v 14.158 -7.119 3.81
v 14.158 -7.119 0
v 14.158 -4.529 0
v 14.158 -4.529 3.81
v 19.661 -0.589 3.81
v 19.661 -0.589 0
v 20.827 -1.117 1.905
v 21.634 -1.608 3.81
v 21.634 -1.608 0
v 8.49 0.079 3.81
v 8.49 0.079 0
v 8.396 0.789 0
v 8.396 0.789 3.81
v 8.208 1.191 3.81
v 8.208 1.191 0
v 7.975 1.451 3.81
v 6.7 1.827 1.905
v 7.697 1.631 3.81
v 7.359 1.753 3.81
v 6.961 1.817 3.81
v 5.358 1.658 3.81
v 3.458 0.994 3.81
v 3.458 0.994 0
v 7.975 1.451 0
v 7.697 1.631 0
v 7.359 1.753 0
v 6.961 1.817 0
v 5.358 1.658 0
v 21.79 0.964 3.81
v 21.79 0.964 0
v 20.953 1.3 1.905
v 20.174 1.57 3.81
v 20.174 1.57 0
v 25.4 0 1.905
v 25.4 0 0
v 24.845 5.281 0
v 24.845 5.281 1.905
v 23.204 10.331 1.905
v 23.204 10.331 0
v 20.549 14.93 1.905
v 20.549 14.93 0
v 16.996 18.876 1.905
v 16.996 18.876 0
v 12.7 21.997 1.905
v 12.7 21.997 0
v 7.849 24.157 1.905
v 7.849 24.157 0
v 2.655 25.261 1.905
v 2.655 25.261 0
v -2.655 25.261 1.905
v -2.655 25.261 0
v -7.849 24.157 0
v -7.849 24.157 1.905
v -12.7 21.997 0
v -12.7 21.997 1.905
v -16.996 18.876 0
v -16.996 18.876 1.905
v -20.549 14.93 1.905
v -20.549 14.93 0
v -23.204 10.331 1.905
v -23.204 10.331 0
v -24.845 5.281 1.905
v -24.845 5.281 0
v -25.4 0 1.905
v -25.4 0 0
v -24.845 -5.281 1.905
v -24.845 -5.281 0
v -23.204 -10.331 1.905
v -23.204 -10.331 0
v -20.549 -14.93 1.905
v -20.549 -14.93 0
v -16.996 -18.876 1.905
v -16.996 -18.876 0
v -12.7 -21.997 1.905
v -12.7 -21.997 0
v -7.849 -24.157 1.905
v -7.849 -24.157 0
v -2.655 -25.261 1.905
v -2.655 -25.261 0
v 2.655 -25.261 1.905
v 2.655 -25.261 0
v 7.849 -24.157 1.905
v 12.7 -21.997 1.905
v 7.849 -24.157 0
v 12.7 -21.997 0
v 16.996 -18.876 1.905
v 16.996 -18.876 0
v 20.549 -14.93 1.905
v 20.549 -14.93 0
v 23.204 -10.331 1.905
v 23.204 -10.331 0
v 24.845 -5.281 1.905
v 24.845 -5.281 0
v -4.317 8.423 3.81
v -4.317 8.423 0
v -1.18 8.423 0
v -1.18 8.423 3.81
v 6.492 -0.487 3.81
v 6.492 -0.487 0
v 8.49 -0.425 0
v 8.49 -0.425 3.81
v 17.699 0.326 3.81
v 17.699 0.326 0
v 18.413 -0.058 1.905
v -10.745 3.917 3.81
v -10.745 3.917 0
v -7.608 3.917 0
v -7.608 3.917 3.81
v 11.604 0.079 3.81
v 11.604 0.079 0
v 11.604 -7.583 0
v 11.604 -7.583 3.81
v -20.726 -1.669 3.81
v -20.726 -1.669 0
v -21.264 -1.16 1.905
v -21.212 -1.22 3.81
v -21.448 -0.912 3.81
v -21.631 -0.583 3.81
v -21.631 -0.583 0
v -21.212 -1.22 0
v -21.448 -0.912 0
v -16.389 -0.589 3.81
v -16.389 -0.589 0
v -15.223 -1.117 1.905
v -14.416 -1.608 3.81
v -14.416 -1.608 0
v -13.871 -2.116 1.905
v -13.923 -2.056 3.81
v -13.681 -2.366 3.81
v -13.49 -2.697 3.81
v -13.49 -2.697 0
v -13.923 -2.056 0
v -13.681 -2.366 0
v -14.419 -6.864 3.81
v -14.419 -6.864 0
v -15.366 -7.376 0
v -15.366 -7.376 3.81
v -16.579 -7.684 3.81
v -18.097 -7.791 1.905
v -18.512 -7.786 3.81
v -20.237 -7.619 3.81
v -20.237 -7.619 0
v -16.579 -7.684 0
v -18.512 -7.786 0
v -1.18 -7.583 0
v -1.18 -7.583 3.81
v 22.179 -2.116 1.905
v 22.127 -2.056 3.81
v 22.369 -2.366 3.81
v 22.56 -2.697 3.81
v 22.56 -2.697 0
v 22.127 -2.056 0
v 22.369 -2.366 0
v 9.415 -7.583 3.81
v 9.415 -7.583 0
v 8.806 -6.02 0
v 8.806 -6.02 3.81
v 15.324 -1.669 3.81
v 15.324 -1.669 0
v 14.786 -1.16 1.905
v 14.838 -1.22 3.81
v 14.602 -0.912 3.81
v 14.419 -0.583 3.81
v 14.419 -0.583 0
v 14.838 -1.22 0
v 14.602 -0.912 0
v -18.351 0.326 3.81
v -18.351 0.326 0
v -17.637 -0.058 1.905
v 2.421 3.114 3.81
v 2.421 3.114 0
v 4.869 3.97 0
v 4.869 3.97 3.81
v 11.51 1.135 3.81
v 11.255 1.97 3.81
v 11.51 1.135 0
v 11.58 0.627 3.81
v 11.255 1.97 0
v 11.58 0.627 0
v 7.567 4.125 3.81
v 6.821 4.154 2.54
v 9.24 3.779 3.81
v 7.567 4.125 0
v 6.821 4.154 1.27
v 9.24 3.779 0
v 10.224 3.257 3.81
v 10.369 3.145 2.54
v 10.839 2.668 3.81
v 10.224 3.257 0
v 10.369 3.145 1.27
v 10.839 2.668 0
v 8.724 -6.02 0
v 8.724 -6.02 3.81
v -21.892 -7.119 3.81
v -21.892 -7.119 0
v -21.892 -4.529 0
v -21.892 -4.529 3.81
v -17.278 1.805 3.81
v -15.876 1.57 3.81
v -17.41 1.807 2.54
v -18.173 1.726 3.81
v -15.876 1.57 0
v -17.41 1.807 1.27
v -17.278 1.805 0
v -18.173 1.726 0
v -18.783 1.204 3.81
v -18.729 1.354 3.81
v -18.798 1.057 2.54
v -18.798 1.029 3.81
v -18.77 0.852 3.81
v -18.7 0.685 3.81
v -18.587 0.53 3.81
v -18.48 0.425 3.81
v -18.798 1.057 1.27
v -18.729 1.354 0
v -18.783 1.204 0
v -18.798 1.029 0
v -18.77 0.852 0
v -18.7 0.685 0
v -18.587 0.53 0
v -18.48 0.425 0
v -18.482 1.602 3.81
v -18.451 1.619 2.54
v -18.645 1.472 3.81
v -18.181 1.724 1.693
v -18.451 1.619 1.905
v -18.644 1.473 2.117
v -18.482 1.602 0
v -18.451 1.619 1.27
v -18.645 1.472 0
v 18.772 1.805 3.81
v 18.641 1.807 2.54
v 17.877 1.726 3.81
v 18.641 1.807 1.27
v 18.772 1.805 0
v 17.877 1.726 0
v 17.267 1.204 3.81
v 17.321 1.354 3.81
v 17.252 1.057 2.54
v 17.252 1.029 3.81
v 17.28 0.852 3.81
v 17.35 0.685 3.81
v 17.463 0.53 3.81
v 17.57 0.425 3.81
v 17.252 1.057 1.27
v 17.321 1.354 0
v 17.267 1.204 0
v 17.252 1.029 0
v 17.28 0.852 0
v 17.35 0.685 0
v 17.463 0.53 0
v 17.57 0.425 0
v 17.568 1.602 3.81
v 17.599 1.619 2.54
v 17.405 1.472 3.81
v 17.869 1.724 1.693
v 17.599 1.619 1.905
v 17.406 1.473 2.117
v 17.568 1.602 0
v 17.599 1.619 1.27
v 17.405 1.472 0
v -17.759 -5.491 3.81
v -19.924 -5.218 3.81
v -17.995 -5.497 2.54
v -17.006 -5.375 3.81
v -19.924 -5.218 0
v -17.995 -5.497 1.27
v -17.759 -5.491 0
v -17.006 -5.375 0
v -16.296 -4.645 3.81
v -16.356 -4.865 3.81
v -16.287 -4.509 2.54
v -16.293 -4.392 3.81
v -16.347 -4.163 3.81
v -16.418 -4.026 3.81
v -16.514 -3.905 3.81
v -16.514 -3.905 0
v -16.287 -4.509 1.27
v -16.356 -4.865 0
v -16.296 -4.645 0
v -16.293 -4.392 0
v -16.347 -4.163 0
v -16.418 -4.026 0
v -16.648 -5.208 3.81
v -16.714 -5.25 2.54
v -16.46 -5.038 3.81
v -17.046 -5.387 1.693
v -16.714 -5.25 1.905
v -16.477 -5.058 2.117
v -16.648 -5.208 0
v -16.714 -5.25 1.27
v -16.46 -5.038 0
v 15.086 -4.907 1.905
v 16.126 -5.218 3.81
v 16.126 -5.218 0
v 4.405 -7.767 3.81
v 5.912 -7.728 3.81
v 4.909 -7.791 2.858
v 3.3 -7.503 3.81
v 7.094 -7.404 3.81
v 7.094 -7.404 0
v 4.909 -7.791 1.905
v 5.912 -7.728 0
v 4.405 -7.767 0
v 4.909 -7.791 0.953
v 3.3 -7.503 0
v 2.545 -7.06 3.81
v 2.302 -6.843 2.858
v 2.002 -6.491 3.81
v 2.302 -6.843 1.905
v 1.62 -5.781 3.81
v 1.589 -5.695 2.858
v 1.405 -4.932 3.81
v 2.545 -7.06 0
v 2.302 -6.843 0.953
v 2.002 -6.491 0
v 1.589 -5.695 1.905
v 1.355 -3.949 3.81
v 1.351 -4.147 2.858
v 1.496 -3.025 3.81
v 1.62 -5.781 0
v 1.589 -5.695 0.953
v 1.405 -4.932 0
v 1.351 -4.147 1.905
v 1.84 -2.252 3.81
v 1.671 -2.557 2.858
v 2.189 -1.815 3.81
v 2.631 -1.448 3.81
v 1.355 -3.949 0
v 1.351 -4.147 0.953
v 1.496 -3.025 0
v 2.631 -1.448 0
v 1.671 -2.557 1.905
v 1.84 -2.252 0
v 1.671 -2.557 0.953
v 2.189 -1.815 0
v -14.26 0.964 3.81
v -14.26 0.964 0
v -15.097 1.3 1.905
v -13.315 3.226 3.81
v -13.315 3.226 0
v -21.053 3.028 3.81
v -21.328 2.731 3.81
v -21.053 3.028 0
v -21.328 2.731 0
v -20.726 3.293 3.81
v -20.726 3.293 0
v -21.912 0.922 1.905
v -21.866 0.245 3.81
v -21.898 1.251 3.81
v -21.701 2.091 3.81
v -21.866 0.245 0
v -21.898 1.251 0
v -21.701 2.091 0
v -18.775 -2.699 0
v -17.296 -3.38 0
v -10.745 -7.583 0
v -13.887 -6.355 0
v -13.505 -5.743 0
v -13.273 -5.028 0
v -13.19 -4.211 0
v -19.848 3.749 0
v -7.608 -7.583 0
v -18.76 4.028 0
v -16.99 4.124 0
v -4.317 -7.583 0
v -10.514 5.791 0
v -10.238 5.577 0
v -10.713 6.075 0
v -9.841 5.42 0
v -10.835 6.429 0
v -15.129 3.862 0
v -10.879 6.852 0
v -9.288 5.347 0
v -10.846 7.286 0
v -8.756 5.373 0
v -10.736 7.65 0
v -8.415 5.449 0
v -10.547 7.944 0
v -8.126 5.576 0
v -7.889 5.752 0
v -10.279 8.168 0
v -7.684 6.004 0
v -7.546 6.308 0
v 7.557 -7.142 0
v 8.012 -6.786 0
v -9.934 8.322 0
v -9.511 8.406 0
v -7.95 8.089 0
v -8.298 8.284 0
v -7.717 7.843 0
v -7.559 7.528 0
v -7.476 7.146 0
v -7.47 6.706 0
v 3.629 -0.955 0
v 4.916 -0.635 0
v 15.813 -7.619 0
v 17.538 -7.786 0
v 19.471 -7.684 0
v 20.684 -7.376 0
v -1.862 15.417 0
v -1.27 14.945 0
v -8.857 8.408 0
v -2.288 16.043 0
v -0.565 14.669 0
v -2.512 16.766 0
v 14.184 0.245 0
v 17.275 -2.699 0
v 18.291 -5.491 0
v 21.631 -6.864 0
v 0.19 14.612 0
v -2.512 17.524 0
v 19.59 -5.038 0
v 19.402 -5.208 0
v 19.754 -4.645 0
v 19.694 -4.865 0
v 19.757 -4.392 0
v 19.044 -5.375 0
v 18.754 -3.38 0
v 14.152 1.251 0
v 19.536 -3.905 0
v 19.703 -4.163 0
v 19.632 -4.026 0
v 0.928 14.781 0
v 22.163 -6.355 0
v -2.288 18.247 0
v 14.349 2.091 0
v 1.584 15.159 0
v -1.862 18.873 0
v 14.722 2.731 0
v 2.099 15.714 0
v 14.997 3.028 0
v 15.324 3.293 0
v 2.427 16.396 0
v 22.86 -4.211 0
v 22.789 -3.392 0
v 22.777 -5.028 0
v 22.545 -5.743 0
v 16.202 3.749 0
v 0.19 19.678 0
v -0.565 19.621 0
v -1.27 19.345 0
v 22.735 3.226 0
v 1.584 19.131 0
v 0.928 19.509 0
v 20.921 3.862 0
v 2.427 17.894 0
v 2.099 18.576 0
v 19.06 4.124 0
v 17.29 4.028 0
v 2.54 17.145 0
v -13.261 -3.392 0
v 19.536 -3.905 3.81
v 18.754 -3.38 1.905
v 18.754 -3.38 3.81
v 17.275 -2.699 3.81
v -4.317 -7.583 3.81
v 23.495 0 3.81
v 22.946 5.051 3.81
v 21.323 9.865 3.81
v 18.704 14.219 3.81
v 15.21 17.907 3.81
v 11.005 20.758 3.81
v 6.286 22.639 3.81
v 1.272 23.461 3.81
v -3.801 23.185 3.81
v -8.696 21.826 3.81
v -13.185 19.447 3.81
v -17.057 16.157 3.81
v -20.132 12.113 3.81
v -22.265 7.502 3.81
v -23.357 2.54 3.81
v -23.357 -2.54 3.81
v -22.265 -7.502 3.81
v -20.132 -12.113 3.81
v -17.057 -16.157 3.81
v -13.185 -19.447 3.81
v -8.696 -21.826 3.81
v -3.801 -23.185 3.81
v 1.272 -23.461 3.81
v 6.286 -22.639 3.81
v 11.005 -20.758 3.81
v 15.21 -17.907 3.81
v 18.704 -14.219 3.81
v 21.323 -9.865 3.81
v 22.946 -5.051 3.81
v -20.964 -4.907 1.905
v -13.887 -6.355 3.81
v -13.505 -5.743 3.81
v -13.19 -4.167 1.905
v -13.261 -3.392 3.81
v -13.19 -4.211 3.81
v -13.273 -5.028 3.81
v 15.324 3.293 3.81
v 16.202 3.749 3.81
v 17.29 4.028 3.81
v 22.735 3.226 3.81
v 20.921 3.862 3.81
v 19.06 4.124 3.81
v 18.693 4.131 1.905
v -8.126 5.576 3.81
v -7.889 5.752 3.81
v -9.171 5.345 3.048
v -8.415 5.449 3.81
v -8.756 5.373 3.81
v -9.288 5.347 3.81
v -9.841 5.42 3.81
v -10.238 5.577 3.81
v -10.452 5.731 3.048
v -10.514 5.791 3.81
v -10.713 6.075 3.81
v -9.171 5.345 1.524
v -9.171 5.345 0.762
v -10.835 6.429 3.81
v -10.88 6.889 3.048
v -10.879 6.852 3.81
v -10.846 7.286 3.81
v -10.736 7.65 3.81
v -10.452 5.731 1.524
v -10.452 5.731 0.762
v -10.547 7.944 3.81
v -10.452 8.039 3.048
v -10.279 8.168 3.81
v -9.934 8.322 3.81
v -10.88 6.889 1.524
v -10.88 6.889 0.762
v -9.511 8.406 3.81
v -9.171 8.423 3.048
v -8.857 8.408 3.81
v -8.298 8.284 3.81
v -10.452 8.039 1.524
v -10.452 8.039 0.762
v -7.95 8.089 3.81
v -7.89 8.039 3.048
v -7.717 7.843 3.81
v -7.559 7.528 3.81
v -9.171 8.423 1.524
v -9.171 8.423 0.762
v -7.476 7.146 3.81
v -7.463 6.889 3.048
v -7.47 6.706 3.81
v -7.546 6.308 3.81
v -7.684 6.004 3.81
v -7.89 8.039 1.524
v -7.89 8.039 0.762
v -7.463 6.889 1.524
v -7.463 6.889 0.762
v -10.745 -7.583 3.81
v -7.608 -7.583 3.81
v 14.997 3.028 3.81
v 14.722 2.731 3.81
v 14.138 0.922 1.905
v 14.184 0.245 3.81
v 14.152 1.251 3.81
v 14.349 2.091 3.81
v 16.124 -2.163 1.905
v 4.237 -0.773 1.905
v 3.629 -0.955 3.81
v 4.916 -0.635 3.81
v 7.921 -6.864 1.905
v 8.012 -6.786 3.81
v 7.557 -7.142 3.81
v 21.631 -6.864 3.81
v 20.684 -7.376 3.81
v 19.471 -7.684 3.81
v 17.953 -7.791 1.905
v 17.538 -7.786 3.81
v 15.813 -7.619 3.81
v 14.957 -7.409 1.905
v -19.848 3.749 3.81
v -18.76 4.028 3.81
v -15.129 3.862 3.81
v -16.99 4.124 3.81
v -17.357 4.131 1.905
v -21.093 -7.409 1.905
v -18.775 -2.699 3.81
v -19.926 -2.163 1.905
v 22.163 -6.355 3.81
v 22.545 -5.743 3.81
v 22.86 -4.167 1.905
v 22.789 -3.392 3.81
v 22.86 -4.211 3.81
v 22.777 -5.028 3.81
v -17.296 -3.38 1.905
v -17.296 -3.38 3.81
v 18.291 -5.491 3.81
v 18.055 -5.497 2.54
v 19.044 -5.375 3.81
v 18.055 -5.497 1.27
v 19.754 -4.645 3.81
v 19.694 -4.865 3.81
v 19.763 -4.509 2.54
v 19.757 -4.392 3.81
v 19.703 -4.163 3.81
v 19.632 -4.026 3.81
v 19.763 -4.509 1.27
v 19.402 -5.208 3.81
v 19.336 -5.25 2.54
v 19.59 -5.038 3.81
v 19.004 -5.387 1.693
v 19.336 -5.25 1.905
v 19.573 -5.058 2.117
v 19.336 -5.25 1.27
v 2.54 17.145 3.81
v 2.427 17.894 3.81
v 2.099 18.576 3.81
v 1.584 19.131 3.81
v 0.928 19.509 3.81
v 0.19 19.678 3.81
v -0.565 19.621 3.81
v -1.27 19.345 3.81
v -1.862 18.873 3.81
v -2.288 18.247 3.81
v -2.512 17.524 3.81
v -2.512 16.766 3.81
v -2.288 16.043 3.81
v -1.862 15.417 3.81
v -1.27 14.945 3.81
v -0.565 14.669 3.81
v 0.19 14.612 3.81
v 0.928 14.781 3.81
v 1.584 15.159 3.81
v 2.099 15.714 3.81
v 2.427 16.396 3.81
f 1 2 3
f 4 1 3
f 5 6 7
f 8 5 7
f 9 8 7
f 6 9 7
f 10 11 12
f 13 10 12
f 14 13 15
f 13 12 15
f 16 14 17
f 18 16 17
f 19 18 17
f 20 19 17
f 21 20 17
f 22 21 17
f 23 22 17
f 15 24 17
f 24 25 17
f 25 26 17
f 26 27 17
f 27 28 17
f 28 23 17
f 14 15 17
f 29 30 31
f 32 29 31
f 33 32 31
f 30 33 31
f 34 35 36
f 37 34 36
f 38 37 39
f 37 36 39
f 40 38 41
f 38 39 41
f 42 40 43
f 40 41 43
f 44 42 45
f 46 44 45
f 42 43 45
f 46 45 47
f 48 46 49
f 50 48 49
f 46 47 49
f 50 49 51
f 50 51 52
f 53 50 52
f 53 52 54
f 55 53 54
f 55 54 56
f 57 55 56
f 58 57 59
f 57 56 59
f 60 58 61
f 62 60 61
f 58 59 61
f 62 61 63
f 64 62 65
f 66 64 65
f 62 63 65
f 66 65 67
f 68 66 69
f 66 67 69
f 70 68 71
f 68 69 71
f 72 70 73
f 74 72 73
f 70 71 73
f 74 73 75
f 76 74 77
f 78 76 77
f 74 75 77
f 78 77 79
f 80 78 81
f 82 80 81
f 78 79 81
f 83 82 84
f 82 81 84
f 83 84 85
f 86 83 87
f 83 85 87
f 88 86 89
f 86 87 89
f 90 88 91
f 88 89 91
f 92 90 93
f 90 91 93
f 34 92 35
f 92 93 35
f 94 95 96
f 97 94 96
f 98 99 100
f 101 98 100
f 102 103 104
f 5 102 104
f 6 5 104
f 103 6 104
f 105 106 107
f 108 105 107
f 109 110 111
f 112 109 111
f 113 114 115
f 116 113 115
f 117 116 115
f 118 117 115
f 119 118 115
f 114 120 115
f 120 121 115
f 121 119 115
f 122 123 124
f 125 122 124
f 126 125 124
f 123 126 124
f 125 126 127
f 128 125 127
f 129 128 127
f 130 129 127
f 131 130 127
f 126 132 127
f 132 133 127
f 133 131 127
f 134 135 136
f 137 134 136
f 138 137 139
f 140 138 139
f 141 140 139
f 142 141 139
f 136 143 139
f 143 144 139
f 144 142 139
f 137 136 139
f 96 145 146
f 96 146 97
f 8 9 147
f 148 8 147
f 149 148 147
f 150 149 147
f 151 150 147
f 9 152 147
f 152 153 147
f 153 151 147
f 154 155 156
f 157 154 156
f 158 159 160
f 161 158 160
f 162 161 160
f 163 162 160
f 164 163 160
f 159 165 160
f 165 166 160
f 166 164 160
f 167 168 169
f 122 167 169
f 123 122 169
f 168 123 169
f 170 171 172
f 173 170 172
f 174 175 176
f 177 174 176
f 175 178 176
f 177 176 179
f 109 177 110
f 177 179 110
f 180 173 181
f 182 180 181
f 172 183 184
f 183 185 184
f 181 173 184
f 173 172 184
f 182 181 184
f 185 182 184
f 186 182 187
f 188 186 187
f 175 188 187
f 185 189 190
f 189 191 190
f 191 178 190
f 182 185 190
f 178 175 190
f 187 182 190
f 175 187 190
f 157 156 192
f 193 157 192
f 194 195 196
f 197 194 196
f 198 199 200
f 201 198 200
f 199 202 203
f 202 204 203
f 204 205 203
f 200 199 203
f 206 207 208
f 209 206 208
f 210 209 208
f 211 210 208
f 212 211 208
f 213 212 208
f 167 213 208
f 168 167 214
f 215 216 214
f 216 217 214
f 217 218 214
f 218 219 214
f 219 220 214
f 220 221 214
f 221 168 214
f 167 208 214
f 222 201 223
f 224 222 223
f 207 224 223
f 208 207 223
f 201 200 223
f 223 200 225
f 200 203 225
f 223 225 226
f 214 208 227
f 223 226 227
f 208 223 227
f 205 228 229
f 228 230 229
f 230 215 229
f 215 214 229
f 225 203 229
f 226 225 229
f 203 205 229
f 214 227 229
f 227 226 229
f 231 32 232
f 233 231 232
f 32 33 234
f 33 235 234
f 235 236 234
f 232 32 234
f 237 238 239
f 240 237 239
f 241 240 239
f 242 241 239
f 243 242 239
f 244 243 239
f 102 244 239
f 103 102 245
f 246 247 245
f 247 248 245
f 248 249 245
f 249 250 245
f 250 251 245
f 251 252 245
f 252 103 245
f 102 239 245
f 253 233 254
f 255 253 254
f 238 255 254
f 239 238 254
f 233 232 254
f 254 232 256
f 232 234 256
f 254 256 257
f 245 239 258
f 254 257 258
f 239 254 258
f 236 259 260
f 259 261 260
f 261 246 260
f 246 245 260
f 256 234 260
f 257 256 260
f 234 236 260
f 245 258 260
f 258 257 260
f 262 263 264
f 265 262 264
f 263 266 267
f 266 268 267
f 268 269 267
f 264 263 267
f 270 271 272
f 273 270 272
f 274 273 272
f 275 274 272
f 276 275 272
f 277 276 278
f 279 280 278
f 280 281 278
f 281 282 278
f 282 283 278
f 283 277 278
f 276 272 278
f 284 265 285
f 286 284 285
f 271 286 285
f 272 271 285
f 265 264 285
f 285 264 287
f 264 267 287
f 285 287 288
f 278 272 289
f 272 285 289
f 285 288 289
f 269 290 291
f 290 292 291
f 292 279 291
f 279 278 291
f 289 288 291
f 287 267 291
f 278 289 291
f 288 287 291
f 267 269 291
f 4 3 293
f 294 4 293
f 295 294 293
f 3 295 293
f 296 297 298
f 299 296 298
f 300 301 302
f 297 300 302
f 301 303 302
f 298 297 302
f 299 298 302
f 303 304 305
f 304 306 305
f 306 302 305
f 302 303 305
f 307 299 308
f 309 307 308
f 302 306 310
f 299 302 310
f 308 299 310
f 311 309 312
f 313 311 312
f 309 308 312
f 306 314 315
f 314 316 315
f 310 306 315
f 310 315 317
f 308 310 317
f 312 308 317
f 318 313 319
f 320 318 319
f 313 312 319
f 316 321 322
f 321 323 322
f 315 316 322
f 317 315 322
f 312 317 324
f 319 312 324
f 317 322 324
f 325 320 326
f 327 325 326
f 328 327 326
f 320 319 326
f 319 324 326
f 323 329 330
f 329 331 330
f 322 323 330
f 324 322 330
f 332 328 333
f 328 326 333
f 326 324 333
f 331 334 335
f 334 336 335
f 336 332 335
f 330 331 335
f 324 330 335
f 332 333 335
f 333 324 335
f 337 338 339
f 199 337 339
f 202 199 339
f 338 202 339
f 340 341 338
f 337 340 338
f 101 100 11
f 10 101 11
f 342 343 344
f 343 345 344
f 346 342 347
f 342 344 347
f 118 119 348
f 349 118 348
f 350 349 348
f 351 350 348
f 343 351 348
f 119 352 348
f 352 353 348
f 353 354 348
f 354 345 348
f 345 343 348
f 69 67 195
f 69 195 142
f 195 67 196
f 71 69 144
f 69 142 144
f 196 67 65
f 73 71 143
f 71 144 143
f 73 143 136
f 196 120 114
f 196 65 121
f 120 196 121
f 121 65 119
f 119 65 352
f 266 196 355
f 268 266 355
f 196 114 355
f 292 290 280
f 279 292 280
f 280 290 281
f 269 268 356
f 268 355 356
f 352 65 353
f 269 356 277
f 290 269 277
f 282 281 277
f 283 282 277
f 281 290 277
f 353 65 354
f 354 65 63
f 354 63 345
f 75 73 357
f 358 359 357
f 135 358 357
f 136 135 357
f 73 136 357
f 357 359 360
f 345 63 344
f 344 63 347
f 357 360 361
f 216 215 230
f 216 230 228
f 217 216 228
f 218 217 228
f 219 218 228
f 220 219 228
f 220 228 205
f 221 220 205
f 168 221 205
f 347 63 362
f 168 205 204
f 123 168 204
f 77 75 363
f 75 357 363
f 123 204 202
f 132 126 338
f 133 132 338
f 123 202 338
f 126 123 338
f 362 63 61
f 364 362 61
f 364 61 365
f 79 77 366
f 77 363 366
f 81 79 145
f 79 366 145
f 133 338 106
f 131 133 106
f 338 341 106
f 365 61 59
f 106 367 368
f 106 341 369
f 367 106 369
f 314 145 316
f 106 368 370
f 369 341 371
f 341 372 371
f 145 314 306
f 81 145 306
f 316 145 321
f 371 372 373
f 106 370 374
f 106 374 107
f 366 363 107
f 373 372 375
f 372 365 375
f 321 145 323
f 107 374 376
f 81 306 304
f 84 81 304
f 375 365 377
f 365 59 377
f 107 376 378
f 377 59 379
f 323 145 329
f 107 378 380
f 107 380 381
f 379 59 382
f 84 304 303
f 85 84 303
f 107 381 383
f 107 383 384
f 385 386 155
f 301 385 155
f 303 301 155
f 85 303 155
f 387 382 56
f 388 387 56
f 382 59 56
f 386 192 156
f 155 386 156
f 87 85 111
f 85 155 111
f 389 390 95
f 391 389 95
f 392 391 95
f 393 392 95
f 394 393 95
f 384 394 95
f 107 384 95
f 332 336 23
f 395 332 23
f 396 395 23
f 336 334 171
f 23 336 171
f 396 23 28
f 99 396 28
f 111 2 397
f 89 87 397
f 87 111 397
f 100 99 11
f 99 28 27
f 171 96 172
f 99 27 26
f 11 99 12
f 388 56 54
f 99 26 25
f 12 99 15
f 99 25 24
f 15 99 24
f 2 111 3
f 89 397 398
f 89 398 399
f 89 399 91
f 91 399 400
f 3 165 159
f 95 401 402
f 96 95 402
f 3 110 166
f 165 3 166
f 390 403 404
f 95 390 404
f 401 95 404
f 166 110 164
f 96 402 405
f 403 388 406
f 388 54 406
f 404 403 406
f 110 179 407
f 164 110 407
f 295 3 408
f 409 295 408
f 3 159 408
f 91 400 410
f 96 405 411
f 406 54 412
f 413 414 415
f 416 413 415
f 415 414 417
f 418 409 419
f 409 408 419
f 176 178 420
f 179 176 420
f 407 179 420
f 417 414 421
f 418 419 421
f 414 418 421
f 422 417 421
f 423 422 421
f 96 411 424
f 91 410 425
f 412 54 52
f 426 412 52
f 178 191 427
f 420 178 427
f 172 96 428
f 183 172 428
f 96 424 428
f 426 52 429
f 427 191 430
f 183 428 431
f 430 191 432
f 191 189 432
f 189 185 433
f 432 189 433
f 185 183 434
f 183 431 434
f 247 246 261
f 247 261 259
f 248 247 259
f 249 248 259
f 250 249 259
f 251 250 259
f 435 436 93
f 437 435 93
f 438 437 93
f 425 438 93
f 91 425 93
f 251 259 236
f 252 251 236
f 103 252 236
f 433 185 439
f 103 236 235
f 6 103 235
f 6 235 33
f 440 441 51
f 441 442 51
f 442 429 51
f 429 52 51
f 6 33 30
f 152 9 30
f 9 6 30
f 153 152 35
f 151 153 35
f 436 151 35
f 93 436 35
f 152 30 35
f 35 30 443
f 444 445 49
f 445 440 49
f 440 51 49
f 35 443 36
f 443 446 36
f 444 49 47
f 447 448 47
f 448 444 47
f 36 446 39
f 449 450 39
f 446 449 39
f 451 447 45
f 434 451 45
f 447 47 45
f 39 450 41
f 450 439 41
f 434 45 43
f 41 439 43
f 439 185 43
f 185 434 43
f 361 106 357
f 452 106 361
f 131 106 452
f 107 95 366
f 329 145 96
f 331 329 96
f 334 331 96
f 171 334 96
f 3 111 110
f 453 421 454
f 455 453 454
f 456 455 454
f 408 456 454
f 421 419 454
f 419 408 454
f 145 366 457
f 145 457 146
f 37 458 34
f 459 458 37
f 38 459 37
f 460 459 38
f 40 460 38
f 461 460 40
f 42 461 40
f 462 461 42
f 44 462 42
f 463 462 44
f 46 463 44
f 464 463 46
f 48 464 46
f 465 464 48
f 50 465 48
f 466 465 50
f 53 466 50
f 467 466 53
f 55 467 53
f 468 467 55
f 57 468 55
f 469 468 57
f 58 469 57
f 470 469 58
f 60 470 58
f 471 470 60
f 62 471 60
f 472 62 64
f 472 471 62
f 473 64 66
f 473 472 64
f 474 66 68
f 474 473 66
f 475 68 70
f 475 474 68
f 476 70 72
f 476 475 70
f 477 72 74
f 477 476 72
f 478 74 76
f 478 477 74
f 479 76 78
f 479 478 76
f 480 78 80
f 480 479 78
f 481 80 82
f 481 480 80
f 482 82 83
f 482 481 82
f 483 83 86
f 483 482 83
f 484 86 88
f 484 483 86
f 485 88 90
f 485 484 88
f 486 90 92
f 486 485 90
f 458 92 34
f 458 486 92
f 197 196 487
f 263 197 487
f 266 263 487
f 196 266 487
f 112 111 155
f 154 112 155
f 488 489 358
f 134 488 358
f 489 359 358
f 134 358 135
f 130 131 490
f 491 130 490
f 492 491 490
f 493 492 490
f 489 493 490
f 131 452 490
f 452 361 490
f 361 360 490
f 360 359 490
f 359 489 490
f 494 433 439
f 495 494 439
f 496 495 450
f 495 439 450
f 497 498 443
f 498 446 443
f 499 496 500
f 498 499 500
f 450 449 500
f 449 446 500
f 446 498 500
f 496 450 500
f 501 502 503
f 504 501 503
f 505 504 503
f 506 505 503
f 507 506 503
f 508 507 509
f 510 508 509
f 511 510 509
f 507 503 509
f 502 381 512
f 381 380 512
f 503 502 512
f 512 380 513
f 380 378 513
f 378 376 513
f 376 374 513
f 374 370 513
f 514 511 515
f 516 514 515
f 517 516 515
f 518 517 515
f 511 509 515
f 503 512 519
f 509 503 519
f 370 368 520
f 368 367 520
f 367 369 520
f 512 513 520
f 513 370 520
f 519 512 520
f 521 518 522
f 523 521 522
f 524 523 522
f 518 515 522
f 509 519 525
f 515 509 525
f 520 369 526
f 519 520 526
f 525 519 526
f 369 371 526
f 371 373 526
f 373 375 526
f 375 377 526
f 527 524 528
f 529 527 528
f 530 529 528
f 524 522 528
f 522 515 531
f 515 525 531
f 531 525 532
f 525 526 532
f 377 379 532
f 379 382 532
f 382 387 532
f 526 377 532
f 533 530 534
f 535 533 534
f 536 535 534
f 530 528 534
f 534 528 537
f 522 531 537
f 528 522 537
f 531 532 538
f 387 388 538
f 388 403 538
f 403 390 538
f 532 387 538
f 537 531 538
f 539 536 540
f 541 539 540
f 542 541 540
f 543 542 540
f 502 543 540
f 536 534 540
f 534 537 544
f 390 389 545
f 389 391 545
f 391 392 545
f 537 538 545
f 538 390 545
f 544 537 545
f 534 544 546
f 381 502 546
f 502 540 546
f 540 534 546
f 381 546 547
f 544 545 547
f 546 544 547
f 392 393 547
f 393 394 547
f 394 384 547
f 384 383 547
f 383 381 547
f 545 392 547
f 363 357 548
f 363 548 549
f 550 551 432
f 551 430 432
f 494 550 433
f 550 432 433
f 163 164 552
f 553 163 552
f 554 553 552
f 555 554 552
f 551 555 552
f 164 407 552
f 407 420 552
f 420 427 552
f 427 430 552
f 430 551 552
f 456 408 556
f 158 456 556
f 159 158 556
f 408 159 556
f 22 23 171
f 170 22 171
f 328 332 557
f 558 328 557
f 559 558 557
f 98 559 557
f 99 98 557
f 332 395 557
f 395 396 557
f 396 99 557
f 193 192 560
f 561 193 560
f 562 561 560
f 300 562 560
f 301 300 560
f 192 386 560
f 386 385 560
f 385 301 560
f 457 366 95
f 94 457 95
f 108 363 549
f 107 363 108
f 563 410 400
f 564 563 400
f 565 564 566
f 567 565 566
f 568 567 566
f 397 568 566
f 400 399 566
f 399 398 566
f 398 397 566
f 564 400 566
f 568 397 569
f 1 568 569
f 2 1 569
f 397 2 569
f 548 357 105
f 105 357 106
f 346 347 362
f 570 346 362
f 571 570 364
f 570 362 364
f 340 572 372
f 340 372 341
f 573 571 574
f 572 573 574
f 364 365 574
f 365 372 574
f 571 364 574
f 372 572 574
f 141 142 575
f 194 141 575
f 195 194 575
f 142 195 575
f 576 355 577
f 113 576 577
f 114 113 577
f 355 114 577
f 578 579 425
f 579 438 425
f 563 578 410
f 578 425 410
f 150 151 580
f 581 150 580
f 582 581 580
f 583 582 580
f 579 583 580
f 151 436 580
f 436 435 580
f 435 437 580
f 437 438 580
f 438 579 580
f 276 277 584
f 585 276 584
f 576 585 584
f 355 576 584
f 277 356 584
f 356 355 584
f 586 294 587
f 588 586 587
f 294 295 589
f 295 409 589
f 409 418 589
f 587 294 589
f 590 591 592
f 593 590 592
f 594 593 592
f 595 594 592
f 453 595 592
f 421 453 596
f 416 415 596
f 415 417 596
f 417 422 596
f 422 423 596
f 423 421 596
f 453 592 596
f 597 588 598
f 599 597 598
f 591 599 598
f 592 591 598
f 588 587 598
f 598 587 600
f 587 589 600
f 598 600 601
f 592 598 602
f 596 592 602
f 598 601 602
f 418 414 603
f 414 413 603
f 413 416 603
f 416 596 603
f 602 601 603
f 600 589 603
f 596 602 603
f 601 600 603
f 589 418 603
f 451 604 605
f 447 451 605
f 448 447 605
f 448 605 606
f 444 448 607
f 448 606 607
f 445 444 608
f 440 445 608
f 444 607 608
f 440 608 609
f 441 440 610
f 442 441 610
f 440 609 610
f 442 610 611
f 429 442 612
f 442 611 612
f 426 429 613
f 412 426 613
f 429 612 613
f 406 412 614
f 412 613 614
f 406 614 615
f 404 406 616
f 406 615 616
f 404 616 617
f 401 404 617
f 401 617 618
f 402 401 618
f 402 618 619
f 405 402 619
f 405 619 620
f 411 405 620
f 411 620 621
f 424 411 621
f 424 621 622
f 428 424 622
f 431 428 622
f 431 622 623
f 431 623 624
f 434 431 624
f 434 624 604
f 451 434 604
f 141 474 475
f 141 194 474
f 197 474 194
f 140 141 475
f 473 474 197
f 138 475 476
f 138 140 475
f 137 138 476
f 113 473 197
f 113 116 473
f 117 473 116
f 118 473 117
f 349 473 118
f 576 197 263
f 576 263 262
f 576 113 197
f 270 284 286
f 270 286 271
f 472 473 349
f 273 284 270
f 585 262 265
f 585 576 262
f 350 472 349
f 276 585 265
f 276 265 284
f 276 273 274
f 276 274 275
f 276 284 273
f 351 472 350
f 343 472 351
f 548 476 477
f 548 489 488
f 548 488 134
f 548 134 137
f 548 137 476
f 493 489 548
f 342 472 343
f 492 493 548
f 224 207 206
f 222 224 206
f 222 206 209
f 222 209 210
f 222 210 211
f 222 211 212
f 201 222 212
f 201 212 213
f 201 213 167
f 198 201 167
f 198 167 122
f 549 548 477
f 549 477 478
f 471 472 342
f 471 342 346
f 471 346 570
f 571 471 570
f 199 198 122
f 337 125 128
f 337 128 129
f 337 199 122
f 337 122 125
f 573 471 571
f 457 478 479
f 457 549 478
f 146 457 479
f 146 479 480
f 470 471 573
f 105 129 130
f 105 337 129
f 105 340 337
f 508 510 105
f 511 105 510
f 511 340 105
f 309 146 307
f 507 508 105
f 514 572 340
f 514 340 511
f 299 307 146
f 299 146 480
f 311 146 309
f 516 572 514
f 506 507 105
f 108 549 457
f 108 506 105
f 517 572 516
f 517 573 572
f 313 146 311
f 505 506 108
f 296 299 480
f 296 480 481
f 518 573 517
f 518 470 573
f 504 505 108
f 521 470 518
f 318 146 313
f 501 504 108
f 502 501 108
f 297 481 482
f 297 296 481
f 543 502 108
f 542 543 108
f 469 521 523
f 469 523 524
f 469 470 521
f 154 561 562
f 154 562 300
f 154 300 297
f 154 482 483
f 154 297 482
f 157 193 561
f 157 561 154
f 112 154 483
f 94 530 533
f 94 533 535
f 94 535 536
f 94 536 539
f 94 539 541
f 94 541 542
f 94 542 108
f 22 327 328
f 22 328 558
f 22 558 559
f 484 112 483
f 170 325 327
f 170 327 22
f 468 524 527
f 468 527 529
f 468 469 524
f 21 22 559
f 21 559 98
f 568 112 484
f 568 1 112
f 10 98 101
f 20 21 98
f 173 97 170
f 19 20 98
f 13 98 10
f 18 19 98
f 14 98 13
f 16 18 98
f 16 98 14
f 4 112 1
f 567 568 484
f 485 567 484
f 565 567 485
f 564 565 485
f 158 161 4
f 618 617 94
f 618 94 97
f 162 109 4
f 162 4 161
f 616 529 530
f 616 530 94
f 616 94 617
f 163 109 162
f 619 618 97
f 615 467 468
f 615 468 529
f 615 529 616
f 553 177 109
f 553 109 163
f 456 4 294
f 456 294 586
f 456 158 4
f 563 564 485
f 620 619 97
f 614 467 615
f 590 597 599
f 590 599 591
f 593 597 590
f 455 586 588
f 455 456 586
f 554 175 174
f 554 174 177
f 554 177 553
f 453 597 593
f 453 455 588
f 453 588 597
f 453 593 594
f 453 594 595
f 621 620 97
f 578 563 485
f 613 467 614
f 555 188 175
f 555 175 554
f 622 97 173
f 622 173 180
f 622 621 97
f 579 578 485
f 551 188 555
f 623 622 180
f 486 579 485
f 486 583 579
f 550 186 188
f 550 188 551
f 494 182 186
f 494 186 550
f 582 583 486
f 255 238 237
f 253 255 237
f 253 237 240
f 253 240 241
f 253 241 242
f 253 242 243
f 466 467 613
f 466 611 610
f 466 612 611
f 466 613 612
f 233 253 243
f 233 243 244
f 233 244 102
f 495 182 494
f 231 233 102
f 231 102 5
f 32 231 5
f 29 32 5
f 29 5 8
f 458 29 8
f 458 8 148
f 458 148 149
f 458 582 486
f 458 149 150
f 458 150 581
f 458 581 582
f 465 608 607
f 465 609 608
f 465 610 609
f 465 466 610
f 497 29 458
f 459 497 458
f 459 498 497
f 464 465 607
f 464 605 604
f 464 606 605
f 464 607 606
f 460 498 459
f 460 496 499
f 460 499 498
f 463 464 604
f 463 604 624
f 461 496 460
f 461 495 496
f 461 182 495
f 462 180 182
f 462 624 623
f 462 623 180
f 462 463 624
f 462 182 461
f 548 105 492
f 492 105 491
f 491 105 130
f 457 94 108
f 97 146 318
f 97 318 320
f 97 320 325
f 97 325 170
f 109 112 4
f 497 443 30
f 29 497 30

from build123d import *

# Parameters (mm, degrees)
F0_R     = 25.4
F0_W     = 3.1366467497
F0_H     = 11.499940969
F0_H_2   = 16.0057850407
F1_DEPTH = 3.81
F2_SIZE  = 1.905
F3_R     = 2.54
F4_DEPTH = 25.4


with BuildPart() as f1:
    # F0 (on Top) → F1 (new body)
    with BuildSketch(Plane.XY):
        Circle(F0_R)
        with BuildLine():
            add(Edge.make_bspline(
                [(-13.4895558275, -2.6972523911), (-13.1900439133, -3.3143785879), (-13.1900439133, -4.1668355744)],
                knots=[0, 0, 0, 1, 1, 1], degree=2))
            add(Edge.make_bspline(
                [(-13.1900439133, -4.1668355744), (-13.1900439133, -5.9375763418), (-14.4193592974, -6.864088472)],
                knots=[0, 0, 0, 1, 1, 1], degree=2))
            add(Edge.make_bspline(
                [(-14.4193592974, -6.864088472), (-15.6486746814, -7.7906006021), (-18.0974314304, -7.7906006021)],
                knots=[0, 0, 0, 1, 1, 1], degree=2))
            add(Edge.make_bspline(
                [(-18.0974314304, -7.7906006021), (-19.3514318624, -7.7906006021), (-20.2368022461, -7.6194509369)],
                knots=[0, 0, 0, 1, 1, 1], degree=2))
            add(Edge.make_bspline(
                [(-20.2368022461, -7.6194509369), (-21.1221726298, -7.4483012716), (-21.8923461234, -7.1191673)],
                knots=[0, 0, 0, 1, 1, 1], degree=2))
            Line((-21.8923461234, -7.1191673), (-21.8923461234, -4.5288829432))
            add(Edge.make_bspline(
                [(-21.8923461234, -4.5288829432), (-21.0201410986, -4.9403004078), (-19.924124973, -5.2184186138)],
                knots=[0, 0, 0, 1, 1, 1], degree=2))
            add(Edge.make_bspline(
                [(-19.924124973, -5.2184186138), (-18.8281088475, -5.4965368198), (-17.9953998992, -5.4965368198)],
                knots=[0, 0, 0, 1, 1, 1], degree=2))
            add(Edge.make_bspline(
                [(-17.9953998992, -5.4965368198), (-16.2871945864, -5.4965368198), (-16.2871945864, -4.5091349049)],
                knots=[0, 0, 0, 1, 1, 1], degree=2))
            add(Edge.make_bspline(
                [(-16.2871945864, -4.5091349049), (-16.2871945864, -4.137213517), (-16.5142970269, -3.905174067)],
                knots=[0, 0, 0, 1, 1, 1], degree=2))
            add(Edge.make_bspline(
                [(-16.5142970269, -3.905174067), (-16.7413994673, -3.673134617), (-17.2959902095, -3.3802053822)],
                knots=[0, 0, 0, 1, 1, 1], degree=2))
            add(Edge.make_bspline(
                [(-17.2959902095, -3.3802053822), (-17.8505809517, -3.0872761474), (-18.775447412, -2.6988980609)],
                knots=[0, 0, 0, 1, 1, 1], degree=2))
            add(Edge.make_bspline(
                [(-18.775447412, -2.6988980609), (-20.1018573177, -2.1426616489), (-20.7255661939, -1.6687087297)],
                knots=[0, 0, 0, 1, 1, 1], degree=2))
            add(Edge.make_bspline(
                [(-20.7255661939, -1.6687087297), (-21.3492750702, -1.1947558105), (-21.6306846159, -0.5825666233)],
                knots=[0, 0, 0, 1, 1, 1], degree=2))
            add(Edge.make_bspline(
                [(-21.6306846159, -0.5825666233), (-21.9120941617, 0.0296225639), (-21.9120941617, 0.9215756271)],
                knots=[0, 0, 0, 1, 1, 1], degree=2))
            add(Edge.make_bspline(
                [(-21.9120941617, 0.9215756271), (-21.9120941617, 2.4553399349), (-20.7255661939, 3.2929858927)],
                knots=[0, 0, 0, 1, 1, 1], degree=2))
            add(Edge.make_bspline(
                [(-20.7255661939, 3.2929858927), (-19.5390382262, 4.1306318505), (-17.3568799942, 4.1306318505)],
                knots=[0, 0, 0, 1, 1, 1], degree=2))
            add(Edge.make_bspline(
                [(-17.3568799942, 4.1306318505), (-15.2800446332, 4.1306318505), (-13.3151148225, 3.2255134285)],
                knots=[0, 0, 0, 1, 1, 1], degree=2))
            Line((-13.3151148225, 3.2255134285), (-14.2597293211, 0.9643630434))
            add(Edge.make_bspline(
                [(-14.2597293211, 0.9643630434), (-15.1253516665, 1.3329930916), (-15.8757771219, 1.5699695512)],
                knots=[0, 0, 0, 1, 1, 1], degree=2))
            add(Edge.make_bspline(
                [(-15.8757771219, 1.5699695512), (-16.6262025772, 1.8069460108), (-17.4095414297, 1.8069460108)],
                knots=[0, 0, 0, 1, 1, 1], degree=2))
            add(Edge.make_bspline(
                [(-17.4095414297, 1.8069460108), (-18.79848679, 1.8069460108), (-18.79848679, 1.0565205555)],
                knots=[0, 0, 0, 1, 1, 1], degree=2))
            add(Edge.make_bspline(
                [(-18.79848679, 1.0565205555), (-18.79848679, 0.6352290718), (-18.3508645886, 0.3258431384)],
                knots=[0, 0, 0, 1, 1, 1], degree=2))
            add(Edge.make_bspline(
                [(-18.3508645886, 0.3258431384), (-17.9032423872, 0.0164572051), (-16.3892261176, -0.5891493027)],
                knots=[0, 0, 0, 1, 1, 1], degree=2))
            add(Edge.make_bspline(
                [(-16.3892261176, -0.5891493027), (-15.0430681736, -1.1355116956), (-14.4160679577, -1.6078189449)],
                knots=[0, 0, 0, 1, 1, 1], degree=2))
            add(Edge.make_bspline(
                [(-14.4160679577, -1.6078189449), (-13.7890677417, -2.0801261942), (-13.4895558275, -2.6972523911)],
                knots=[0, 0, 0, 1, 1, 1], degree=2))
        make_face(mode=Mode.SUBTRACT)
        with Locations((-9.1762551292, -1.8332757155)):
            Rectangle(F0_W, F0_H, mode=Mode.SUBTRACT)
        with BuildLine():
            Line((11.60361817, -7.5832462), (9.4148772587, -7.5832462))
            Line((9.4148772587, -7.5832462), (8.8059794111, -6.0198598347))
            Line((8.8059794111, -6.0198598347), (8.7236959182, -6.0198598347))
            add(Edge.make_bspline(
                [(8.7236959182, -6.0198598347), (7.9337743863, -7.0171357688), (7.0944827586, -7.4038681855)],
                knots=[0, 0, 0, 1, 1, 1], degree=2))
            add(Edge.make_bspline(
                [(7.0944827586, -7.4038681855), (6.2551911309, -7.7906006021), (4.909033187, -7.7906006021)],
                knots=[0, 0, 0, 1, 1, 1], degree=2))
            add(Edge.make_bspline(
                [(4.909033187, -7.7906006021), (3.2534893096, -7.7906006021), (2.3022921316, -6.8426947638)],
                knots=[0, 0, 0, 1, 1, 1], degree=2))
            add(Edge.make_bspline(
                [(2.3022921316, -6.8426947638), (1.3510949536, -5.8947889255), (1.3510949536, -4.1470875361)],
                knots=[0, 0, 0, 1, 1, 1], degree=2))
            add(Edge.make_bspline(
                [(1.3510949536, -4.1470875361), (1.3510949536, -2.3171026538), (2.6314261032, -1.4481889687)],
                knots=[0, 0, 0, 1, 1, 1], degree=2))
            add(Edge.make_bspline(
                [(2.6314261032, -1.4481889687), (3.9117572529, -0.5792752836), (6.4921675905, -0.4871177715)],
                knots=[0, 0, 0, 1, 1, 1], degree=2))
            Line((6.4921675905, -0.4871177715), (8.4900107984, -0.4245823169))
            Line((8.4900107984, -0.4245823169), (8.4900107984, 0.0789926597))
            add(Edge.make_bspline(
                [(8.4900107984, 0.0789926597), (8.4900107984, 1.8266940491), (6.6995219927, 1.8266940491)],
                knots=[0, 0, 0, 1, 1, 1], degree=2))
            add(Edge.make_bspline(
                [(6.6995219927, 1.8266940491), (5.3204506515, 1.8266940491), (3.457552372, 0.9939851008)],
                knots=[0, 0, 0, 1, 1, 1], degree=2))
            Line((3.457552372, 0.9939851008), (2.4207803614, 3.1136078782))
            add(Edge.make_bspline(
                [(2.4207803614, 3.1136078782), (4.4054582104, 4.1536712286), (6.8213015622, 4.1536712286)],
                knots=[0, 0, 0, 1, 1, 1], degree=2))
            add(Edge.make_bspline(
                [(6.8213015622, 4.1536712286), (9.1351133828, 4.1536712286), (10.3693657764, 3.1448756055)],
                knots=[0, 0, 0, 1, 1, 1], degree=2))
            add(Edge.make_bspline(
                [(10.3693657764, 3.1448756055), (11.60361817, 2.1360799824), (11.60361817, 0.0789926597)],
                knots=[0, 0, 0, 1, 1, 1], degree=2))
            Line((11.60361817, 0.0789926597), (11.60361817, -7.5832462))
        make_face(mode=Mode.SUBTRACT)
        with BuildLine():
            add(Edge.make_bspline(
                [(22.5604880858, -2.6972523911), (22.86, -3.3143785879), (22.86, -4.1668355744)],
                knots=[0, 0, 0, 1, 1, 1], degree=2))
            add(Edge.make_bspline(
                [(22.86, -4.1668355744), (22.86, -5.9375763418), (21.6306846159, -6.864088472)],
                knots=[0, 0, 0, 1, 1, 1], degree=2))
            add(Edge.make_bspline(
                [(21.6306846159, -6.864088472), (20.4013692319, -7.7906006021), (17.9526124829, -7.7906006021)],
                knots=[0, 0, 0, 1, 1, 1], degree=2))
            add(Edge.make_bspline(
                [(17.9526124829, -7.7906006021), (16.698612051, -7.7906006021), (15.8132416673, -7.6194509369)],
                knots=[0, 0, 0, 1, 1, 1], degree=2))
            add(Edge.make_bspline(
                [(15.8132416673, -7.6194509369), (14.9278712836, -7.4483012716), (14.1576977899, -7.1191673)],
                knots=[0, 0, 0, 1, 1, 1], degree=2))
            Line((14.1576977899, -7.1191673), (14.1576977899, -4.5288829432))
            add(Edge.make_bspline(
                [(14.1576977899, -4.5288829432), (15.0299028148, -4.9403004078), (16.1259189403, -5.2184186138)],
                knots=[0, 0, 0, 1, 1, 1], degree=2))
            add(Edge.make_bspline(
                [(16.1259189403, -5.2184186138), (17.2219350659, -5.4965368198), (18.0546440141, -5.4965368198)],
                knots=[0, 0, 0, 1, 1, 1], degree=2))
            add(Edge.make_bspline(
                [(18.0546440141, -5.4965368198), (19.7628493269, -5.4965368198), (19.7628493269, -4.5091349049)],
                knots=[0, 0, 0, 1, 1, 1], degree=2))
            add(Edge.make_bspline(
                [(19.7628493269, -4.5091349049), (19.7628493269, -4.137213517), (19.5357468865, -3.905174067)],
                knots=[0, 0, 0, 1, 1, 1], degree=2))
            add(Edge.make_bspline(
                [(19.5357468865, -3.905174067), (19.308644446, -3.673134617), (18.7540537038, -3.3802053822)],
                knots=[0, 0, 0, 1, 1, 1], degree=2))
            add(Edge.make_bspline(
                [(18.7540537038, -3.3802053822), (18.1994629616, -3.0872761474), (17.2745965013, -2.6988980609)],
                knots=[0, 0, 0, 1, 1, 1], degree=2))
            add(Edge.make_bspline(
                [(17.2745965013, -2.6988980609), (15.9481865956, -2.1426616489), (15.3244777194, -1.6687087297)],
                knots=[0, 0, 0, 1, 1, 1], degree=2))
            add(Edge.make_bspline(
                [(15.3244777194, -1.6687087297), (14.7007688431, -1.1947558105), (14.4193592974, -0.5825666233)],
                knots=[0, 0, 0, 1, 1, 1], degree=2))
            add(Edge.make_bspline(
                [(14.4193592974, -0.5825666233), (14.1379497516, 0.0296225639), (14.1379497516, 0.9215756271)],
                knots=[0, 0, 0, 1, 1, 1], degree=2))
            add(Edge.make_bspline(
                [(14.1379497516, 0.9215756271), (14.1379497516, 2.4553399349), (15.3244777194, 3.2929858927)],
                knots=[0, 0, 0, 1, 1, 1], degree=2))
            add(Edge.make_bspline(
                [(15.3244777194, 3.2929858927), (16.5110056871, 4.1306318505), (18.6931639191, 4.1306318505)],
                knots=[0, 0, 0, 1, 1, 1], degree=2))
            add(Edge.make_bspline(
                [(18.6931639191, 4.1306318505), (20.7699992801, 4.1306318505), (22.7349290908, 3.2255134285)],
                knots=[0, 0, 0, 1, 1, 1], degree=2))
            Line((22.7349290908, 3.2255134285), (21.7903145922, 0.9643630434))
            add(Edge.make_bspline(
                [(21.7903145922, 0.9643630434), (20.9246922468, 1.3329930916), (20.1742667914, 1.5699695512)],
                knots=[0, 0, 0, 1, 1, 1], degree=2))
            add(Edge.make_bspline(
                [(20.1742667914, 1.5699695512), (19.4238413361, 1.8069460108), (18.6405024836, 1.8069460108)],
                knots=[0, 0, 0, 1, 1, 1], degree=2))
            add(Edge.make_bspline(
                [(18.6405024836, 1.8069460108), (17.2515571233, 1.8069460108), (17.2515571233, 1.0565205555)],
                knots=[0, 0, 0, 1, 1, 1], degree=2))
            add(Edge.make_bspline(
                [(17.2515571233, 1.0565205555), (17.2515571233, 0.6352290718), (17.6991793247, 0.3258431384)],
                knots=[0, 0, 0, 1, 1, 1], degree=2))
            add(Edge.make_bspline(
                [(17.6991793247, 0.3258431384), (18.1468015262, 0.0164572051), (19.6608177957, -0.5891493027)],
                knots=[0, 0, 0, 1, 1, 1], degree=2))
            add(Edge.make_bspline(
                [(19.6608177957, -0.5891493027), (21.0069757397, -1.1355116956), (21.6339759557, -1.6078189449)],
                knots=[0, 0, 0, 1, 1, 1], degree=2))
            add(Edge.make_bspline(
                [(21.6339759557, -1.6078189449), (22.2609761716, -2.0801261942), (22.5604880858, -2.6972523911)],
                knots=[0, 0, 0, 1, 1, 1], degree=2))
        make_face(mode=Mode.SUBTRACT)
        with Locations((-2.7482686632, 0.4196463203)):
            Rectangle(F0_W, F0_H_2, mode=Mode.SUBTRACT)
        with BuildLine():
            add(Edge.make_bspline(
                [(-9.1713181196, 5.3451362059), (-10.8795234324, 5.3451362059), (-10.8795234324, 6.8887745328)],
                knots=[0, 0, 0, 1, 1, 1], degree=2))
            add(Edge.make_bspline(
                [(-10.8795234324, 6.8887745328), (-10.8795234324, 8.4225388407), (-9.1713181196, 8.4225388407)],
                knots=[0, 0, 0, 1, 1, 1], degree=2))
            add(Edge.make_bspline(
                [(-9.1713181196, 8.4225388407), (-7.4631128069, 8.4225388407), (-7.4631128069, 6.8887745328)],
                knots=[0, 0, 0, 1, 1, 1], degree=2))
            add(Edge.make_bspline(
                [(-7.4631128069, 6.8887745328), (-7.4631128069, 6.1580971158), (-7.8893413001, 5.7516166608)],
                knots=[0, 0, 0, 1, 1, 1], degree=2))
            add(Edge.make_bspline(
                [(-7.8893413001, 5.7516166608), (-8.3155697934, 5.3451362059), (-9.1713181196, 5.3451362059)],
                knots=[0, 0, 0, 1, 1, 1], degree=2))
        make_face(mode=Mode.SUBTRACT)
    extrude(amount=F1_DEPTH)

    # F2
    f2_edges = [f1.edges().sort_by_distance(p)[0] for p in [
        (-25.4, 0, 3.81),
    ]]
    chamfer(f2_edges, length=F2_SIZE)

    # F3 (on face) → F4 (cut)
    with BuildSketch(Plane.XY.offset(3.81)):
        with Locations((0, 17.145)):
            Circle(F3_R)
    extrude(amount=-F4_DEPTH, mode=Mode.SUBTRACT)


solid = f1.part
